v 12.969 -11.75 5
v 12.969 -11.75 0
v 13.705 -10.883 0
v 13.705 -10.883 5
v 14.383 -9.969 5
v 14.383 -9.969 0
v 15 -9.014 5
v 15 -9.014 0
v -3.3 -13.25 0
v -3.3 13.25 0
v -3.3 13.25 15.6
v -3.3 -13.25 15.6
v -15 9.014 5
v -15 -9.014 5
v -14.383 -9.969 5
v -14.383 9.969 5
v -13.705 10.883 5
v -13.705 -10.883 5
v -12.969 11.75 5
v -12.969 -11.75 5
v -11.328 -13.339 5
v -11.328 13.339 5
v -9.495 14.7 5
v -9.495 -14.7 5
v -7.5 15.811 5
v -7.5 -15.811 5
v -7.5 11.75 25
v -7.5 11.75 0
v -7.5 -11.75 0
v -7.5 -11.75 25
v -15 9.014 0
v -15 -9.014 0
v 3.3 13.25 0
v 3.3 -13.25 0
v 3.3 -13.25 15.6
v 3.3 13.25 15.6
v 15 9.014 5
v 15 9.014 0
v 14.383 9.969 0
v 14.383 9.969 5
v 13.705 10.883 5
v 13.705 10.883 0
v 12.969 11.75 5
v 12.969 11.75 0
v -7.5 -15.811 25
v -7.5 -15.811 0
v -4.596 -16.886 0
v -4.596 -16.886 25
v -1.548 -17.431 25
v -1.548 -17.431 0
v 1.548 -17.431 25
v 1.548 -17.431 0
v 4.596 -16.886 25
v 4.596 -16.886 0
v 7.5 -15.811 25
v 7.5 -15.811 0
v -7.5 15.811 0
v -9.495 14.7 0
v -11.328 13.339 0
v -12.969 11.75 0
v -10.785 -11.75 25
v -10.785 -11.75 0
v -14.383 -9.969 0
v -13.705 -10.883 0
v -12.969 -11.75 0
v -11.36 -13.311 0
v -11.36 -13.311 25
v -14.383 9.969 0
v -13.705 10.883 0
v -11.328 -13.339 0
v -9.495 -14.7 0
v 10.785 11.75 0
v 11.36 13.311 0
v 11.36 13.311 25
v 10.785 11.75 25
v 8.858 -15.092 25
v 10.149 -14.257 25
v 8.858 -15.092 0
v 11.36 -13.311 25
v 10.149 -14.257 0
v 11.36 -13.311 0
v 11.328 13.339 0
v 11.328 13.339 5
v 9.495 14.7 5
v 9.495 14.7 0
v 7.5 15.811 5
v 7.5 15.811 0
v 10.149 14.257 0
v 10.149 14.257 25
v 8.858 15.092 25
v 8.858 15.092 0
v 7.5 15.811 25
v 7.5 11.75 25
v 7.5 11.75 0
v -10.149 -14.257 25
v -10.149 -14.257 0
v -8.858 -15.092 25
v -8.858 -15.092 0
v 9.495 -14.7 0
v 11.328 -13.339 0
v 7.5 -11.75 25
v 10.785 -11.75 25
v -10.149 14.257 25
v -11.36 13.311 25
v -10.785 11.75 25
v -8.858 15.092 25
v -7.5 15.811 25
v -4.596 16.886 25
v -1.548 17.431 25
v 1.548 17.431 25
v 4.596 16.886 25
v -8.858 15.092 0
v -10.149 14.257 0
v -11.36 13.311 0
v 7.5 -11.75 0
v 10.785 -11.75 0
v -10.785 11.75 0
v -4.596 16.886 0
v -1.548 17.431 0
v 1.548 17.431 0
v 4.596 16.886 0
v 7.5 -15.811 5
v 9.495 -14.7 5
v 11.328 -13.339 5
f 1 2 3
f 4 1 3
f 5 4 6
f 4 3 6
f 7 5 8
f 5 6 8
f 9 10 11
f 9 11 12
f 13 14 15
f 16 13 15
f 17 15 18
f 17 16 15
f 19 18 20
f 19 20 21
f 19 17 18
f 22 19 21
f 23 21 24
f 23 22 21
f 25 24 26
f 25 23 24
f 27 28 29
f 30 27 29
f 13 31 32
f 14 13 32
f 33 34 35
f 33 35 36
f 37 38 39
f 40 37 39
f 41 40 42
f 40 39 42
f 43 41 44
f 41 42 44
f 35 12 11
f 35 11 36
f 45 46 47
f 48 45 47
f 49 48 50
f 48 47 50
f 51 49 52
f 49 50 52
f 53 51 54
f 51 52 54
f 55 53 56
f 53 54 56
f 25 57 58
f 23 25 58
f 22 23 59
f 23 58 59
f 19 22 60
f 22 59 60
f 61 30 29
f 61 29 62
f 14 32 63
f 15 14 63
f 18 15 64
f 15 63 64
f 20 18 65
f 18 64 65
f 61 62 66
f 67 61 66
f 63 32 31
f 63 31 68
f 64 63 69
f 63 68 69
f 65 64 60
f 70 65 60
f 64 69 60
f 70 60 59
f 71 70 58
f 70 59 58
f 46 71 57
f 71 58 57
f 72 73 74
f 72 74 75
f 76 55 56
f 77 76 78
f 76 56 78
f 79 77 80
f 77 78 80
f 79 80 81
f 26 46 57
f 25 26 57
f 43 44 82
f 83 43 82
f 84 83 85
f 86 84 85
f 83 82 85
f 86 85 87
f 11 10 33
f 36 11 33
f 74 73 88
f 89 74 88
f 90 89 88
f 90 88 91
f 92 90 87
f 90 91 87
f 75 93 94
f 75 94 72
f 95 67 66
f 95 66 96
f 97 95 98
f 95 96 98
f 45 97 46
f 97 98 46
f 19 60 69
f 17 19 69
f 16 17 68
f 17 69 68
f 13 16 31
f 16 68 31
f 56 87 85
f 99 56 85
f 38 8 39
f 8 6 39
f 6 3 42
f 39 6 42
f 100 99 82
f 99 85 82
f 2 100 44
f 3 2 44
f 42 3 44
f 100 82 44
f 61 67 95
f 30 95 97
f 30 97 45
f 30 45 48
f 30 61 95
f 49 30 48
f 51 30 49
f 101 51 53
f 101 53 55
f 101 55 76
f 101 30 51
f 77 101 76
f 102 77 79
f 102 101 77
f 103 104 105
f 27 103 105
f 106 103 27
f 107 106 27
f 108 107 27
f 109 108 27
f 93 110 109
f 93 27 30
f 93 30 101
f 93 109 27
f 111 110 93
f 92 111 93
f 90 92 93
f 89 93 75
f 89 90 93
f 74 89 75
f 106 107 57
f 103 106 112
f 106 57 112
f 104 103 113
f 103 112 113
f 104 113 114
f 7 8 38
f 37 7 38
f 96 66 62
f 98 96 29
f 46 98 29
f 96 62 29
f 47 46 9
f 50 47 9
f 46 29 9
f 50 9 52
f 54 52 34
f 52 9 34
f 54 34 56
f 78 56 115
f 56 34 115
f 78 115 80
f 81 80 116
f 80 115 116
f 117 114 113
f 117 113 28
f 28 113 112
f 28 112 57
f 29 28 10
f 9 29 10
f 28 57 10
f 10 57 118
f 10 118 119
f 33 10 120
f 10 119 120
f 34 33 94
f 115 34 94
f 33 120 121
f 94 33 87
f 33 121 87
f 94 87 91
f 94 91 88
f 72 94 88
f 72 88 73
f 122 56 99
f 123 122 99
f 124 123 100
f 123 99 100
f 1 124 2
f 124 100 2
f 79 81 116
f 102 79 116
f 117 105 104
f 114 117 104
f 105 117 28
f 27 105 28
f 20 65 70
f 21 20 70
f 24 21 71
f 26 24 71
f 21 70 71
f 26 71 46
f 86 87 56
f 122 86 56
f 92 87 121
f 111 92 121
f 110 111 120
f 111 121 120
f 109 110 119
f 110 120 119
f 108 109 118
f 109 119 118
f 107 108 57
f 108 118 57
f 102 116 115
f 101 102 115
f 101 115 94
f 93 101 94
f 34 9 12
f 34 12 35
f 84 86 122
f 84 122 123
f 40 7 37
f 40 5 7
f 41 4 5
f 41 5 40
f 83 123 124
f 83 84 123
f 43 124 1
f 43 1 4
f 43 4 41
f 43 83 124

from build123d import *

# Parameters (mm, degrees)
F1_DEPTH    = 5
F0_W        = 6.6
F0_H        = 1.5
F0_W_2      = 4.2
F0_H_2      = 23.5
F2_DEPTH    = 25
F3_DEPTH    = 15.6
F4_T1_DEPTH = 36.3750267574


# Not quite as in the source:
# - a fillet or chamfer that OpenCascade refuses, or shapes differently, is made with other operations: its cross-section is extruded or revolved along the edge and cut away or added


with BuildPart() as f1:
    # F0 (on Top) → F1 (new body)
    with BuildSketch(Plane.XY):
        with BuildLine():
            Line((15, -9.0138781887), (15, 9.0138781887))
            ThreePointArc((15, 9.0138781887), (14.0511141288, 10.4314999755), (12.9687123493, 11.75))
            Line((12.9687123493, 11.75), (7.5, 11.75))
            Line((7.5, 11.75), (7.5, -11.75))
            Line((7.5, -11.75), (12.9687123493, -11.75))
            ThreePointArc((12.9687123493, -11.75), (14.0511141288, -10.4314999755), (15, -9.0138781887))
        make_face()
        with BuildLine():
            ThreePointArc((7.5, -15.8113883008), (10.4338758399, -14.0493499834), (12.9687123493, -11.75))
            Line((12.9687123493, -11.75), (7.5, -11.75))
            Line((7.5, -11.75), (7.5, -15.8113883008))
        make_face()
        with BuildLine():
            Line((7.5, 11.75), (12.9687123493, 11.75))
            ThreePointArc((12.9687123493, 11.75), (10.4338758399, 14.0493499834), (7.5, 15.8113883008))
            Line((7.5, 15.8113883008), (7.5, 11.75))
        make_face()
    extrude(amount=F1_DEPTH)


with BuildPart() as f1b:
    # F0 (on Top) → F1, piece 2 (new body)
    with BuildSketch(Plane.XY):
        with BuildLine():
            Line((-7.5, 11.75), (-12.9687123493, 11.75))
            ThreePointArc((-12.9687123493, 11.75), (-14.0511141288, 10.4314999755), (-15, 9.0138781887))
            Line((-15, 9.0138781887), (-15, -9.0138781887))
            ThreePointArc((-15, -9.0138781887), (-14.0511141288, -10.4314999755), (-12.9687123493, -11.75))
            Line((-12.9687123493, -11.75), (-7.5, -11.75))
            Line((-7.5, -11.75), (-7.5, 11.75))
        make_face()
        with BuildLine():
            Line((-7.5, 11.75), (-7.5, 15.8113883008))
            ThreePointArc((-7.5, 15.8113883008), (-10.4338758399, 14.0493499834), (-12.9687123493, 11.75))
            Line((-12.9687123493, 11.75), (-7.5, 11.75))
        make_face()
        with BuildLine():
            ThreePointArc((-12.9687123493, -11.75), (-10.4338758399, -14.0493499834), (-7.5, -15.8113883008))
            Line((-7.5, -15.8113883008), (-7.5, -11.75))
            Line((-7.5, -11.75), (-12.9687123493, -11.75))
        make_face()
    extrude(amount=F1_DEPTH)


with BuildPart() as f2:
    # F0 (on Top) → F2 (new body)
    with BuildSketch(Plane.XY):
        with Locations((0, 12.5)):
            Rectangle(F0_W, F0_H)
        with BuildLine():
            Line((7.5, 11.75), (7.5, 15.8113883008))
            ThreePointArc((7.5, 15.8113883008), (0, 17.5), (-7.5, 15.8113883008))
            Line((-7.5, 15.8113883008), (-7.5, 11.75))
            Line((-7.5, 11.75), (-3.3, 11.75))
            Line((-3.3, 11.75), (-3.3, 13.25))
            Line((-3.3, 13.25), (3.3, 13.25))
            Line((3.3, 13.25), (3.3, 11.75))
            Line((3.3, 11.75), (7.5, 11.75))
        make_face()
        with Locations((-5.4, 0)):
            Rectangle(F0_W_2, F0_H_2)
        with BuildLine():
            ThreePointArc((-7.5, -15.8113883008), (0, -17.5), (7.5, -15.8113883008))
            Line((7.5, -15.8113883008), (7.5, -11.75))
            Line((7.5, -11.75), (3.3, -11.75))
            Line((3.3, -11.75), (3.3, -13.25))
            Line((3.3, -13.25), (-3.3, -13.25))
            Line((-3.3, -13.25), (-3.3, -11.75))
            Line((-3.3, -11.75), (-7.5, -11.75))
            Line((-7.5, -11.75), (-7.5, -15.8113883008))
        make_face()
        with Locations((5.4, 0)):
            Rectangle(F0_W_2, F0_H_2)
        Rectangle(F0_W, F0_H_2)
        with Locations((0, -12.5)):
            Rectangle(F0_W, F0_H)
        with BuildLine():
            ThreePointArc((-12.9687123493, -11.75), (-10.4338758399, -14.0493499834), (-7.5, -15.8113883008))
            Line((-7.5, -15.8113883008), (-7.5, -11.75))
            Line((-7.5, -11.75), (-12.9687123493, -11.75))
        make_face()
        with BuildLine():
            Line((-7.5, 11.75), (-7.5, 15.8113883008))
            ThreePointArc((-7.5, 15.8113883008), (-10.4338758399, 14.0493499834), (-12.9687123493, 11.75))
            Line((-12.9687123493, 11.75), (-7.5, 11.75))
        make_face()
        with BuildLine():
            Line((7.5, 11.75), (12.9687123493, 11.75))
            ThreePointArc((12.9687123493, 11.75), (10.4338758399, 14.0493499834), (7.5, 15.8113883008))
            Line((7.5, 15.8113883008), (7.5, 11.75))
        make_face()
        with BuildLine():
            ThreePointArc((7.5, -15.8113883008), (10.4338758399, -14.0493499834), (12.9687123493, -11.75))
            Line((12.9687123493, -11.75), (7.5, -11.75))
            Line((7.5, -11.75), (7.5, -15.8113883008))
        make_face()
    extrude(amount=F2_DEPTH)

    # F0 (on Top) → F3 (cut)
    with BuildSketch(Plane.XY):
        with Locations((0, 12.5)):
            Rectangle(F0_W, F0_H)
        Rectangle(F0_W, F0_H_2)
        with Locations((0, -12.5)):
            Rectangle(F0_W, F0_H)
    extrude(amount=F3_DEPTH, mode=Mode.SUBTRACT)

    # F4: chamfer of 2 on 4 edges, made by hand

    # F4_s2 → F4_t1 (cut)
    with BuildSketch(Plane.XY.offset(-5.6875133787)):
        with BuildLine():
            Line((-10.7571586121, -11.6749396443), (-11.3881617362, -13.3863096005))
            Line((-11.3881617362, -13.3863096005), (-11.4141285615, -13.4167353131))
            ThreePointArc((-11.4141285615, -13.4167353131), (-12.2058182488, -12.5964122224), (-12.9983551204, -11.7768571429))
            Line((-12.9983551204, -11.7768571429), (-12.9687123493, -11.71))
            ThreePointArc((-12.9687123493, -11.71), (-11.8629354807, -11.71), (-10.7571586121, -11.6349396443))
            Line((-10.7571586121, -11.6349396443), (-10.7571586121, -11.6749396443))
        make_face()
        with BuildLine():
            Line((11.3881617362, -13.3863096005), (10.7571586121, -11.6749396443))
            Line((10.7571586121, -11.6749396443), (10.7571586121, -11.6349396443))
            ThreePointArc((10.7571586121, -11.6349396443), (11.8629354807, -11.71), (12.9687123493, -11.71))
            Line((12.9687123493, -11.71), (12.9983551204, -11.7768571429))
            ThreePointArc((12.9983551204, -11.7768571429), (12.2058182488, -12.5964122224), (11.4141285615, -13.4167353131))
            Line((11.4141285615, -13.4167353131), (11.3881617362, -13.3863096005))
        make_face()
        with BuildLine():
            Line((11.3881617362, 13.3863096005), (10.7571586121, 11.6749396443))
            Line((10.7571586121, 11.6749396443), (10.7571586121, 11.6349396443))
            ThreePointArc((10.7571586121, 11.6349396443), (11.8629354807, 11.71), (12.9687123493, 11.71))
            Line((12.9687123493, 11.71), (12.9983551204, 11.7768571429))
            ThreePointArc((12.9983551204, 11.7768571429), (12.2058182488, 12.5964122224), (11.4141285615, 13.4167353131))
            Line((11.4141285615, 13.4167353131), (11.3881617362, 13.3863096005))
        make_face()
        with BuildLine():
            Line((-10.7571586121, 11.6749396443), (-11.3881617362, 13.3863096005))
            Line((-11.3881617362, 13.3863096005), (-11.4141285615, 13.4167353131))
            ThreePointArc((-11.4141285615, 13.4167353131), (-12.2058182488, 12.5964122224), (-12.9983551204, 11.7768571429))
            Line((-12.9983551204, 11.7768571429), (-12.9687123493, 11.71))
            ThreePointArc((-12.9687123493, 11.71), (-11.8629354807, 11.71), (-10.7571586121, 11.6349396443))
            Line((-10.7571586121, 11.6349396443), (-10.7571586121, 11.6749396443))
        make_face()
    extrude(amount=F4_T1_DEPTH, mode=Mode.SUBTRACT)


solid = Compound([f1.part, f1b.part, f2.part])
